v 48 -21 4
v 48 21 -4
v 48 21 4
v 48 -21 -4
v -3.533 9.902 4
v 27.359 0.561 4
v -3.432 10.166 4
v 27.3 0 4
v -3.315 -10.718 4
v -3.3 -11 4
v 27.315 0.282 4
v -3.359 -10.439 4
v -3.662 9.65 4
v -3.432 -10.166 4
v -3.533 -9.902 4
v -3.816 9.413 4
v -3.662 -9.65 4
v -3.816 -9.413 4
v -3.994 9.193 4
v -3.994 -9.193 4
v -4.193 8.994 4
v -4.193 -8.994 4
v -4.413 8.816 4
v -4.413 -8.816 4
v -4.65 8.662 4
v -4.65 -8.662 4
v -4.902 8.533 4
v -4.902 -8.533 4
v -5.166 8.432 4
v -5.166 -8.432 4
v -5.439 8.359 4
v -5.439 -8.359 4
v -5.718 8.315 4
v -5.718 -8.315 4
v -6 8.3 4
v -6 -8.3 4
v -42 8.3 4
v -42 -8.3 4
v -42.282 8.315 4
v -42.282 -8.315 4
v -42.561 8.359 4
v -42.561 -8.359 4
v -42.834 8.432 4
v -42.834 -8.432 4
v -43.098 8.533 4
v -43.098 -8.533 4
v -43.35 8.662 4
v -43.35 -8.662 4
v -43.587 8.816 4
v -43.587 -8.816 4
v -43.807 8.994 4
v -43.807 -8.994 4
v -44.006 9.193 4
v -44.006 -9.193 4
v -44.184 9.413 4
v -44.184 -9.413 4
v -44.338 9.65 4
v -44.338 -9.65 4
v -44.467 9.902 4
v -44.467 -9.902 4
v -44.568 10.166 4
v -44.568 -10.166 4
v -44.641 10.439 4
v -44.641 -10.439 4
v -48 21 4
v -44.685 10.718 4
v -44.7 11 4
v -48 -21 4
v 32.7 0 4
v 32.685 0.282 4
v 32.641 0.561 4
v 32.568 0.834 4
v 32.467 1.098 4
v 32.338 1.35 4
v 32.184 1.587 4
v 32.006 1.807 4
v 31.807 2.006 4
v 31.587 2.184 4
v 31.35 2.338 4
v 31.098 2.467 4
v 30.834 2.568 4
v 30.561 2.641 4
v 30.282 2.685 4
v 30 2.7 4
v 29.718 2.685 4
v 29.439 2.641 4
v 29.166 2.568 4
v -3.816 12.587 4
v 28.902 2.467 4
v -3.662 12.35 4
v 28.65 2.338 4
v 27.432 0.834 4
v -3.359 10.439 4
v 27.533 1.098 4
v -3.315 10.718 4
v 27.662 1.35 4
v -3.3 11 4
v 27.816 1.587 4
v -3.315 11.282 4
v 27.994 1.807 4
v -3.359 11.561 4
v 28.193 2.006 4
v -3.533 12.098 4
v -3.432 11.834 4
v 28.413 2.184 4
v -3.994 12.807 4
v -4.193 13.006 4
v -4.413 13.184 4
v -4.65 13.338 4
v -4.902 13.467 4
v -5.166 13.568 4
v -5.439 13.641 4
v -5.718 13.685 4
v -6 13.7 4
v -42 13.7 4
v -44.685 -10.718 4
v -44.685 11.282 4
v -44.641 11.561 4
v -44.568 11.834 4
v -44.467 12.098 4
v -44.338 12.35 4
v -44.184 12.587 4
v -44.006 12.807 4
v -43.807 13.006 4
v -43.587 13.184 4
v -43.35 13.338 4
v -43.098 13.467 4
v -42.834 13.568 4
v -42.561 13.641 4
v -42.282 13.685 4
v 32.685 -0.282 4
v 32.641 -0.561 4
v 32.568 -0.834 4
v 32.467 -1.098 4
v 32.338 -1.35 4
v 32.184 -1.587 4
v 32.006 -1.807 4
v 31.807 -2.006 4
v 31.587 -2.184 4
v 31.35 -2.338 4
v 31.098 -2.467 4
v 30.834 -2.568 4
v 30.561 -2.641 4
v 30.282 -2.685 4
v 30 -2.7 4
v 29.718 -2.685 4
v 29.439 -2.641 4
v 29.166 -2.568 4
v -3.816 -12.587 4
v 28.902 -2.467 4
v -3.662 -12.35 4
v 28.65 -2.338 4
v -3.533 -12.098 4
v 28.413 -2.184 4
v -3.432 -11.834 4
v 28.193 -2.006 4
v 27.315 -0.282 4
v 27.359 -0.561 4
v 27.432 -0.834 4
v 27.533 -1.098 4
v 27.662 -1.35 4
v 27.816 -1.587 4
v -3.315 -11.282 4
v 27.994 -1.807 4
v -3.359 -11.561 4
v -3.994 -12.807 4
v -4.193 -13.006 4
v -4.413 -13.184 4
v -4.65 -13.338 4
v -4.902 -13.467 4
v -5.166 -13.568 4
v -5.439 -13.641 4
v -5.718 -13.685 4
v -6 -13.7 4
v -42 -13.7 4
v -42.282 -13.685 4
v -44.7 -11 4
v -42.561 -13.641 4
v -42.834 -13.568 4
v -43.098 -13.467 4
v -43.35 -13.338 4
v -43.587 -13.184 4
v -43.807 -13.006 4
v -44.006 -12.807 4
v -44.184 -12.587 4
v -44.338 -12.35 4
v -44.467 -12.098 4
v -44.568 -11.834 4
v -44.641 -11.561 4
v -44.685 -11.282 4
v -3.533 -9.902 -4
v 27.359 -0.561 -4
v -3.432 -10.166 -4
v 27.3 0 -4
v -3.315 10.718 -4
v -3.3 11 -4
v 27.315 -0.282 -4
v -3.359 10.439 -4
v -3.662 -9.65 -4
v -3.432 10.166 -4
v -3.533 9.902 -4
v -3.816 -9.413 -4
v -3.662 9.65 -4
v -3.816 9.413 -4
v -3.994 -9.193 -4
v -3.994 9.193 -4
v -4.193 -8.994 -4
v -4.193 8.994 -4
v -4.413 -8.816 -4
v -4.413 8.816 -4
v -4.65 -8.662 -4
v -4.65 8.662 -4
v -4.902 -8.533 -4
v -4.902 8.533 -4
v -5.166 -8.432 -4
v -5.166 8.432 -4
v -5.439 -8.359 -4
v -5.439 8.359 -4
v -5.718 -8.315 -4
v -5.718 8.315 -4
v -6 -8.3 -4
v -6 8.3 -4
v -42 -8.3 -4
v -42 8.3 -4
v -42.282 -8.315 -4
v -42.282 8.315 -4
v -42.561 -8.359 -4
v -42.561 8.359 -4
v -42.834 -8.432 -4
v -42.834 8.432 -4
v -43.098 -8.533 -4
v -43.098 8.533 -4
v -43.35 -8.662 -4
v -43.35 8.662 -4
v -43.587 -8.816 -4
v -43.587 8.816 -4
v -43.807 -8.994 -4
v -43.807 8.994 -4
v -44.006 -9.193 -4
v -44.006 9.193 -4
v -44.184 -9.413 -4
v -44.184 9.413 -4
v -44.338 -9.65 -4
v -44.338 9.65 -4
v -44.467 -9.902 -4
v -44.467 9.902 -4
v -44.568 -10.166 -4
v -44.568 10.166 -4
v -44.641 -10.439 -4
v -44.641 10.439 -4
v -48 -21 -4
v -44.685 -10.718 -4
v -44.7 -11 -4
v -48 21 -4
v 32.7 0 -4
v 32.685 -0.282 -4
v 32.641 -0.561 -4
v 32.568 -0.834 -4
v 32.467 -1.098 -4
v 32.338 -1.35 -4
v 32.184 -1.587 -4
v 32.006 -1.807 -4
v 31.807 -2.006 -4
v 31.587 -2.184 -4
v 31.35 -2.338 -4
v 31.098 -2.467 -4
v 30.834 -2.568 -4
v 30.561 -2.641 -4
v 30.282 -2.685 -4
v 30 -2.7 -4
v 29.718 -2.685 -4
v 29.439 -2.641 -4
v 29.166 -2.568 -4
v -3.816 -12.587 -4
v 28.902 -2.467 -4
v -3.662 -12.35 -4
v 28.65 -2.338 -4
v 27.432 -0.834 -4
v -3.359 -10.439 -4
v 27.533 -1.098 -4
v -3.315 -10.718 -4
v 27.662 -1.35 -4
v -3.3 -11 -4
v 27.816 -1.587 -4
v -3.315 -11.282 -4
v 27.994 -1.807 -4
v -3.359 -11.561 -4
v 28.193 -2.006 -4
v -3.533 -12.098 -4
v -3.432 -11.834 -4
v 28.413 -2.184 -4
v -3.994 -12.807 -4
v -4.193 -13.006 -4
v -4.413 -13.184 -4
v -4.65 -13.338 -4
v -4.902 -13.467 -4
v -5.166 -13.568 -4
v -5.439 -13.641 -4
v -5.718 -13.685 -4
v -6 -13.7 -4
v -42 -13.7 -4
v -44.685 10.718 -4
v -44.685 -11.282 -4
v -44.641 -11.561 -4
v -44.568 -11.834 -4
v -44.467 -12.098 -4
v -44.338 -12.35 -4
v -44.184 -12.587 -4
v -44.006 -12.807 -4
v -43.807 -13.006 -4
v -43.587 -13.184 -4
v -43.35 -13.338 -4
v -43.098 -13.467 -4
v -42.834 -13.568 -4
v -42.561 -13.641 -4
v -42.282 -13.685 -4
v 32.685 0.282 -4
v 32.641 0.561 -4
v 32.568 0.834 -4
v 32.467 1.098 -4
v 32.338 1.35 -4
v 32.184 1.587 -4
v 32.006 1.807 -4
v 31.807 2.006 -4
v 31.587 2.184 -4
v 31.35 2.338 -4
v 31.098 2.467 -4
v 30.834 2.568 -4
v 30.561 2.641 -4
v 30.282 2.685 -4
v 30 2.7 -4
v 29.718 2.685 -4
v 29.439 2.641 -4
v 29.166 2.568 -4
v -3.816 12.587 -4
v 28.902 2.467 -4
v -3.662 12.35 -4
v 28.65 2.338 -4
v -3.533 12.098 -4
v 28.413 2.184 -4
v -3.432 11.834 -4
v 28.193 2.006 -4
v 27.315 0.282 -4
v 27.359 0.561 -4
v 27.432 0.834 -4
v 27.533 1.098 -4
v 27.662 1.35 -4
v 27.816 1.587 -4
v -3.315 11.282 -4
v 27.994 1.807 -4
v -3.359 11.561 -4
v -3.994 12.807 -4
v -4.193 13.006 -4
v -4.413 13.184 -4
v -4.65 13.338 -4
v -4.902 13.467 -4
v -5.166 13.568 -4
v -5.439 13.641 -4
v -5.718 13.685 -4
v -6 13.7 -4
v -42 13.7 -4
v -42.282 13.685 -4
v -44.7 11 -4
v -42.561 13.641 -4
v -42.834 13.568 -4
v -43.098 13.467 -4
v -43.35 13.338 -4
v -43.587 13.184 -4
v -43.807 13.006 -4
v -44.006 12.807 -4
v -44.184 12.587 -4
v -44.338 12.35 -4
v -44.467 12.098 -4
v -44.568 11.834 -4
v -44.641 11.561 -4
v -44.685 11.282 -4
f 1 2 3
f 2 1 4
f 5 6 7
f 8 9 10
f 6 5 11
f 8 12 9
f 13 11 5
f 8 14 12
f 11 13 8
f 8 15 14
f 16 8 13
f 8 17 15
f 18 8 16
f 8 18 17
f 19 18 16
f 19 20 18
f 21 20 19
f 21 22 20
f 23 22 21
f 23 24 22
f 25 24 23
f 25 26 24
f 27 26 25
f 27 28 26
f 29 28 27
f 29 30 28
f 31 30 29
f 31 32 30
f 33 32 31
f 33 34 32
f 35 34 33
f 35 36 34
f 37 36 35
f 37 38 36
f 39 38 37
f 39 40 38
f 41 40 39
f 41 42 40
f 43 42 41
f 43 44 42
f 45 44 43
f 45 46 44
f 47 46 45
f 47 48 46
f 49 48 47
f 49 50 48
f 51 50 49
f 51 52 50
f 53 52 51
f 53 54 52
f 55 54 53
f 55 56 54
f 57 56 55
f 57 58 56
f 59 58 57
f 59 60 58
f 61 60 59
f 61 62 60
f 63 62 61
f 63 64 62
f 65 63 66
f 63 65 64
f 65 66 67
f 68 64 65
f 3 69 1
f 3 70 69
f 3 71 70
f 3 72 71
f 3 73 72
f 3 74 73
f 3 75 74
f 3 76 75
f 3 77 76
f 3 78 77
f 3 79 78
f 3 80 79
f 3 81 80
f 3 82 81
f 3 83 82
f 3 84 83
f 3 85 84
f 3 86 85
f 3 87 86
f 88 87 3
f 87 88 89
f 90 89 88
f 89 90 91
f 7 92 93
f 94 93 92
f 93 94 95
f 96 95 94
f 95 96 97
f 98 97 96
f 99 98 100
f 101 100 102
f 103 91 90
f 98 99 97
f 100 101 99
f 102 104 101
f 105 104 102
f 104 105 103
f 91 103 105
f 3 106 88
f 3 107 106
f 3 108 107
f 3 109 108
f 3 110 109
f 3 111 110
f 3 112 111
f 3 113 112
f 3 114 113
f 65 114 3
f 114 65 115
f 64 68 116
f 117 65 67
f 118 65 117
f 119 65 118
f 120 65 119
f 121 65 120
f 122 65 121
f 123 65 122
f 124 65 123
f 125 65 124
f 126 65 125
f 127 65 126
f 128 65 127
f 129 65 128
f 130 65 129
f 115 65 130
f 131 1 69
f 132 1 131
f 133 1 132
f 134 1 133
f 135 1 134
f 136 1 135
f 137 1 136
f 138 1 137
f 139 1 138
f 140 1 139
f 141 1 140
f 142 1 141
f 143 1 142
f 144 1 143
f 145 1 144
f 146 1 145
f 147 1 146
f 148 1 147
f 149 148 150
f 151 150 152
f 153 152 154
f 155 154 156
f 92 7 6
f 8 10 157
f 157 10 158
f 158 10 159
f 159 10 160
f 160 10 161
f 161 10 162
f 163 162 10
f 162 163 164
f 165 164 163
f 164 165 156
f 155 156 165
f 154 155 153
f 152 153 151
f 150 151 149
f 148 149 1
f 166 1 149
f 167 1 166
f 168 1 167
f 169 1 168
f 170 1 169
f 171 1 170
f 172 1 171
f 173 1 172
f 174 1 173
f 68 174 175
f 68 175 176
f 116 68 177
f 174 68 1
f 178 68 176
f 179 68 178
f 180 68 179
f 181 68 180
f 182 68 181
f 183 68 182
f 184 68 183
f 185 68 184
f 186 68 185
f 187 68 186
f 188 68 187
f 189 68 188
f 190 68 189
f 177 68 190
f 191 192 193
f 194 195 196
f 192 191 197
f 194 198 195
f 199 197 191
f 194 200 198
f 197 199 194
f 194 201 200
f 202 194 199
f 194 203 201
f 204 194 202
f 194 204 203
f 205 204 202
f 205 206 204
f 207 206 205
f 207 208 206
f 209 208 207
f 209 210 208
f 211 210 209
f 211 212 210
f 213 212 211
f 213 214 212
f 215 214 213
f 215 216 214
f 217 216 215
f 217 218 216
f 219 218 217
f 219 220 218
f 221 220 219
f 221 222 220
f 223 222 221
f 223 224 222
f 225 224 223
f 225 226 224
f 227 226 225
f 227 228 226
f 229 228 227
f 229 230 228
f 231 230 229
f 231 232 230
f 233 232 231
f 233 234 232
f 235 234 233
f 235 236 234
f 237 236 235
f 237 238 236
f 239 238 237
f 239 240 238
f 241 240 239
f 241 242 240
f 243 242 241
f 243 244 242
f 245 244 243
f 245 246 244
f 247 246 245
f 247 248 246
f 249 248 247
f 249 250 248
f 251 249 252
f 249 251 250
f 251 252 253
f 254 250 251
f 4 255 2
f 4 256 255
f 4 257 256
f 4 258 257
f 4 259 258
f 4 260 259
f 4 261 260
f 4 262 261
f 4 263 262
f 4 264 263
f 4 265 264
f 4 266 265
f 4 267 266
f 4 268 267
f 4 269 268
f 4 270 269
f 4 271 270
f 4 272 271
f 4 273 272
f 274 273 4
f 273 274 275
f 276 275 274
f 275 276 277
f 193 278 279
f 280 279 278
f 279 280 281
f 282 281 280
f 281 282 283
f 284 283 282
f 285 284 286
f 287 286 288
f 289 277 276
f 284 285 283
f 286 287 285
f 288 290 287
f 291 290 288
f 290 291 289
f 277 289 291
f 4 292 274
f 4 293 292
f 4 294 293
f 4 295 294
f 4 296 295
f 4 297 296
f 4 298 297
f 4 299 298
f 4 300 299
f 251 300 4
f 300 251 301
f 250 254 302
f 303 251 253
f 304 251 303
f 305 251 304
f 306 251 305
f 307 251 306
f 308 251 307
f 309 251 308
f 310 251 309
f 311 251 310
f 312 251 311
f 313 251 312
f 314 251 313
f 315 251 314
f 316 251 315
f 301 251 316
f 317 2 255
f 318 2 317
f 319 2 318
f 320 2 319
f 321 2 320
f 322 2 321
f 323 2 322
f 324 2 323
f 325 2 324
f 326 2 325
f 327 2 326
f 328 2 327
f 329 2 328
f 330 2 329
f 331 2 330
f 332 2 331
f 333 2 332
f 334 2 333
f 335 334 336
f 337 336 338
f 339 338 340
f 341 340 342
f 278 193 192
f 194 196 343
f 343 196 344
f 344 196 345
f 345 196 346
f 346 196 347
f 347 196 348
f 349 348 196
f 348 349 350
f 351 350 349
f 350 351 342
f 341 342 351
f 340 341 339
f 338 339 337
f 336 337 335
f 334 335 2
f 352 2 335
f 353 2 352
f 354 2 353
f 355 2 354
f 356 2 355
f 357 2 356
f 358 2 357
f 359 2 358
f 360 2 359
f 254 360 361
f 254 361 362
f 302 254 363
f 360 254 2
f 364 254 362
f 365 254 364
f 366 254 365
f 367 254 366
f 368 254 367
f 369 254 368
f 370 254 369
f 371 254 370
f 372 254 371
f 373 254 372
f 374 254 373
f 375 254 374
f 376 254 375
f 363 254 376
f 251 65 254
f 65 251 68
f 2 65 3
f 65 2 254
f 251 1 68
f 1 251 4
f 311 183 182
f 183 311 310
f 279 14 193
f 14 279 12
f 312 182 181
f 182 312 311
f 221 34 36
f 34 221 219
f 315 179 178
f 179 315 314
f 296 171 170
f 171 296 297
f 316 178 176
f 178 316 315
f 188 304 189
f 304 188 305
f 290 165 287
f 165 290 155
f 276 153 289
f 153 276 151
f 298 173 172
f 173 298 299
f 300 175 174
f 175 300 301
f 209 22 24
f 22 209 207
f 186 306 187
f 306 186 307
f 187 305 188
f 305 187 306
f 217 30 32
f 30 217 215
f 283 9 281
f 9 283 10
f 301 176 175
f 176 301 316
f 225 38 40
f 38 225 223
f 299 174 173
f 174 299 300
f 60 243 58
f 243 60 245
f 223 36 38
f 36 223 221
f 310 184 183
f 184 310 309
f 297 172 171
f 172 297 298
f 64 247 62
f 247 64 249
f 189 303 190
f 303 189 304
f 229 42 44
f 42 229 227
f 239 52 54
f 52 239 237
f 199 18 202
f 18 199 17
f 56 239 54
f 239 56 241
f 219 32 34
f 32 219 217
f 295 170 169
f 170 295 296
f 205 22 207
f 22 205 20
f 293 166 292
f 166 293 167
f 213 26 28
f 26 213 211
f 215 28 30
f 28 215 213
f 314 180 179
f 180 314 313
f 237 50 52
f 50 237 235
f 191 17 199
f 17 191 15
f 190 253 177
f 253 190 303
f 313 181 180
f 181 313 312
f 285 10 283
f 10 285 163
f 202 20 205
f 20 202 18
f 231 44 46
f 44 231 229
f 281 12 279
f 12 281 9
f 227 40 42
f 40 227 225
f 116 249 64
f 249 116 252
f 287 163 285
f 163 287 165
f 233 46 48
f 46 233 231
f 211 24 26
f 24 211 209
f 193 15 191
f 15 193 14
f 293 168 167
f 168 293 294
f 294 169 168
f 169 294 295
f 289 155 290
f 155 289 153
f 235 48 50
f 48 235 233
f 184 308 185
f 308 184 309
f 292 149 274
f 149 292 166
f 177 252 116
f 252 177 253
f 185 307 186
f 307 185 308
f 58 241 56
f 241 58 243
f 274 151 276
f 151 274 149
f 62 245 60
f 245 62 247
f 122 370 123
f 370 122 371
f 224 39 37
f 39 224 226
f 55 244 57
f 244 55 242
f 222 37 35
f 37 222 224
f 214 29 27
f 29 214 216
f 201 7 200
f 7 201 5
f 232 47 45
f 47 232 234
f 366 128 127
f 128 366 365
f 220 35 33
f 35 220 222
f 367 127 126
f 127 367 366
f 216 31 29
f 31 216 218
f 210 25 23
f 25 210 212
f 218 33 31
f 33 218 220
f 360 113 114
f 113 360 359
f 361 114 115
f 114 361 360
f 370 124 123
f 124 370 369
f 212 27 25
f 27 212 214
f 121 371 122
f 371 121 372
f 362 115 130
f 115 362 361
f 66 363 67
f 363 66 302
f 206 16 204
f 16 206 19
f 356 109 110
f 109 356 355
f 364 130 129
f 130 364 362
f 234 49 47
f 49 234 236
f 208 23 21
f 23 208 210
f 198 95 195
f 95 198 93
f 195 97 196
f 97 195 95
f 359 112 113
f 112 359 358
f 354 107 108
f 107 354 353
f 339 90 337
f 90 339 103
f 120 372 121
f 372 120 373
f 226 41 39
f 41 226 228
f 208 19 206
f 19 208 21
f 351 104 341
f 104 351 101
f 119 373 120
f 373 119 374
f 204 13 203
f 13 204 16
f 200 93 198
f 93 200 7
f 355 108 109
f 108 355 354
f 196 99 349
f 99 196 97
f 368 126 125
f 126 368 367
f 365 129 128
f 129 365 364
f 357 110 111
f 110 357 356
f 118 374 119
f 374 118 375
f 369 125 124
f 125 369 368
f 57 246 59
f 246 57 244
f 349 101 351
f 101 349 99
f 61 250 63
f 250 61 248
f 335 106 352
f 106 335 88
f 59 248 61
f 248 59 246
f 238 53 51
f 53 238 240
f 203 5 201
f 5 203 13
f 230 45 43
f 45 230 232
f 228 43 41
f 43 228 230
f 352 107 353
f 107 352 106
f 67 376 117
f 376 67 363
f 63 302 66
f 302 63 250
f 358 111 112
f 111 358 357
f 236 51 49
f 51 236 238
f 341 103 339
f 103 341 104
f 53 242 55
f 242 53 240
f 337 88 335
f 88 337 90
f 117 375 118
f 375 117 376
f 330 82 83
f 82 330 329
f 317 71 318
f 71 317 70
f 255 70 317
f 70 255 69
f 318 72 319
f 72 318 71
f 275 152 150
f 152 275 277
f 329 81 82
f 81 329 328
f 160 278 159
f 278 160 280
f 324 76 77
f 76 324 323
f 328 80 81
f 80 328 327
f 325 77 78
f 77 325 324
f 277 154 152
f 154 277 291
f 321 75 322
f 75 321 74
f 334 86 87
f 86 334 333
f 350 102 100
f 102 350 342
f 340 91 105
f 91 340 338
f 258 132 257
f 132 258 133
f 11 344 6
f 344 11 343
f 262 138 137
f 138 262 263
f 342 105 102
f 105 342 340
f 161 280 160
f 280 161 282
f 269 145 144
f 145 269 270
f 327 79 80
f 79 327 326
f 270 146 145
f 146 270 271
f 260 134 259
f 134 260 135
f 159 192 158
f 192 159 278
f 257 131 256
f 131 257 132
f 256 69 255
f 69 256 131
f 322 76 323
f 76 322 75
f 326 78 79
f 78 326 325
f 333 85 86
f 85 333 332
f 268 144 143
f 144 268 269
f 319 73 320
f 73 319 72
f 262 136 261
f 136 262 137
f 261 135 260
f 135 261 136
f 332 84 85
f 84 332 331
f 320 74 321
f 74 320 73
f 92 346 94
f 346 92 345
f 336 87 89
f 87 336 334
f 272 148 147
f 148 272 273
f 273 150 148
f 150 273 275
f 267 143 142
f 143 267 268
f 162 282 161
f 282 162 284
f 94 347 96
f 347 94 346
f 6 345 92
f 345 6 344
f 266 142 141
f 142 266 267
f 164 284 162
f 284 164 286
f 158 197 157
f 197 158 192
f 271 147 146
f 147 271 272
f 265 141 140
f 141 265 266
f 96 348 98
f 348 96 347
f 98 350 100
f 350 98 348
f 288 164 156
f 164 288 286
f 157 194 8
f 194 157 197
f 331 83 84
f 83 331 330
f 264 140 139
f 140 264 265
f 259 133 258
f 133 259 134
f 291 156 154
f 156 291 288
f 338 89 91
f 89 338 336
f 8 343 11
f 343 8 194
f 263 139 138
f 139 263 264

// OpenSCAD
// GT2 idler tensioner slide for 9 mm belt.
$fn = 60;
eps = 0.02;
slide_l = 96;
slide_w = 42;
slide_t = 8;
belt_w = 9;
slot_l = 36;
axle_d = 5.4;
axle_x = slide_l / 2 - 18;
module slot(y) {
    hull() {
        translate([-slide_l / 4 - slot_l / 2, y, -slide_t / 2 - eps]) cylinder(d = 5.4, h = slide_t + 2 * eps);
        translate([-slide_l / 4 + slot_l / 2, y, -slide_t / 2 - eps]) cylinder(d = 5.4, h = slide_t + 2 * eps);
    }
}
difference() {
    cube([slide_l, slide_w, slide_t], center = true);
    slot(-11);
    slot(11);
    translate([axle_x, 0, -slide_t / 2 - eps]) cylinder(d = axle_d, h = slide_t + 2 * eps);
}
